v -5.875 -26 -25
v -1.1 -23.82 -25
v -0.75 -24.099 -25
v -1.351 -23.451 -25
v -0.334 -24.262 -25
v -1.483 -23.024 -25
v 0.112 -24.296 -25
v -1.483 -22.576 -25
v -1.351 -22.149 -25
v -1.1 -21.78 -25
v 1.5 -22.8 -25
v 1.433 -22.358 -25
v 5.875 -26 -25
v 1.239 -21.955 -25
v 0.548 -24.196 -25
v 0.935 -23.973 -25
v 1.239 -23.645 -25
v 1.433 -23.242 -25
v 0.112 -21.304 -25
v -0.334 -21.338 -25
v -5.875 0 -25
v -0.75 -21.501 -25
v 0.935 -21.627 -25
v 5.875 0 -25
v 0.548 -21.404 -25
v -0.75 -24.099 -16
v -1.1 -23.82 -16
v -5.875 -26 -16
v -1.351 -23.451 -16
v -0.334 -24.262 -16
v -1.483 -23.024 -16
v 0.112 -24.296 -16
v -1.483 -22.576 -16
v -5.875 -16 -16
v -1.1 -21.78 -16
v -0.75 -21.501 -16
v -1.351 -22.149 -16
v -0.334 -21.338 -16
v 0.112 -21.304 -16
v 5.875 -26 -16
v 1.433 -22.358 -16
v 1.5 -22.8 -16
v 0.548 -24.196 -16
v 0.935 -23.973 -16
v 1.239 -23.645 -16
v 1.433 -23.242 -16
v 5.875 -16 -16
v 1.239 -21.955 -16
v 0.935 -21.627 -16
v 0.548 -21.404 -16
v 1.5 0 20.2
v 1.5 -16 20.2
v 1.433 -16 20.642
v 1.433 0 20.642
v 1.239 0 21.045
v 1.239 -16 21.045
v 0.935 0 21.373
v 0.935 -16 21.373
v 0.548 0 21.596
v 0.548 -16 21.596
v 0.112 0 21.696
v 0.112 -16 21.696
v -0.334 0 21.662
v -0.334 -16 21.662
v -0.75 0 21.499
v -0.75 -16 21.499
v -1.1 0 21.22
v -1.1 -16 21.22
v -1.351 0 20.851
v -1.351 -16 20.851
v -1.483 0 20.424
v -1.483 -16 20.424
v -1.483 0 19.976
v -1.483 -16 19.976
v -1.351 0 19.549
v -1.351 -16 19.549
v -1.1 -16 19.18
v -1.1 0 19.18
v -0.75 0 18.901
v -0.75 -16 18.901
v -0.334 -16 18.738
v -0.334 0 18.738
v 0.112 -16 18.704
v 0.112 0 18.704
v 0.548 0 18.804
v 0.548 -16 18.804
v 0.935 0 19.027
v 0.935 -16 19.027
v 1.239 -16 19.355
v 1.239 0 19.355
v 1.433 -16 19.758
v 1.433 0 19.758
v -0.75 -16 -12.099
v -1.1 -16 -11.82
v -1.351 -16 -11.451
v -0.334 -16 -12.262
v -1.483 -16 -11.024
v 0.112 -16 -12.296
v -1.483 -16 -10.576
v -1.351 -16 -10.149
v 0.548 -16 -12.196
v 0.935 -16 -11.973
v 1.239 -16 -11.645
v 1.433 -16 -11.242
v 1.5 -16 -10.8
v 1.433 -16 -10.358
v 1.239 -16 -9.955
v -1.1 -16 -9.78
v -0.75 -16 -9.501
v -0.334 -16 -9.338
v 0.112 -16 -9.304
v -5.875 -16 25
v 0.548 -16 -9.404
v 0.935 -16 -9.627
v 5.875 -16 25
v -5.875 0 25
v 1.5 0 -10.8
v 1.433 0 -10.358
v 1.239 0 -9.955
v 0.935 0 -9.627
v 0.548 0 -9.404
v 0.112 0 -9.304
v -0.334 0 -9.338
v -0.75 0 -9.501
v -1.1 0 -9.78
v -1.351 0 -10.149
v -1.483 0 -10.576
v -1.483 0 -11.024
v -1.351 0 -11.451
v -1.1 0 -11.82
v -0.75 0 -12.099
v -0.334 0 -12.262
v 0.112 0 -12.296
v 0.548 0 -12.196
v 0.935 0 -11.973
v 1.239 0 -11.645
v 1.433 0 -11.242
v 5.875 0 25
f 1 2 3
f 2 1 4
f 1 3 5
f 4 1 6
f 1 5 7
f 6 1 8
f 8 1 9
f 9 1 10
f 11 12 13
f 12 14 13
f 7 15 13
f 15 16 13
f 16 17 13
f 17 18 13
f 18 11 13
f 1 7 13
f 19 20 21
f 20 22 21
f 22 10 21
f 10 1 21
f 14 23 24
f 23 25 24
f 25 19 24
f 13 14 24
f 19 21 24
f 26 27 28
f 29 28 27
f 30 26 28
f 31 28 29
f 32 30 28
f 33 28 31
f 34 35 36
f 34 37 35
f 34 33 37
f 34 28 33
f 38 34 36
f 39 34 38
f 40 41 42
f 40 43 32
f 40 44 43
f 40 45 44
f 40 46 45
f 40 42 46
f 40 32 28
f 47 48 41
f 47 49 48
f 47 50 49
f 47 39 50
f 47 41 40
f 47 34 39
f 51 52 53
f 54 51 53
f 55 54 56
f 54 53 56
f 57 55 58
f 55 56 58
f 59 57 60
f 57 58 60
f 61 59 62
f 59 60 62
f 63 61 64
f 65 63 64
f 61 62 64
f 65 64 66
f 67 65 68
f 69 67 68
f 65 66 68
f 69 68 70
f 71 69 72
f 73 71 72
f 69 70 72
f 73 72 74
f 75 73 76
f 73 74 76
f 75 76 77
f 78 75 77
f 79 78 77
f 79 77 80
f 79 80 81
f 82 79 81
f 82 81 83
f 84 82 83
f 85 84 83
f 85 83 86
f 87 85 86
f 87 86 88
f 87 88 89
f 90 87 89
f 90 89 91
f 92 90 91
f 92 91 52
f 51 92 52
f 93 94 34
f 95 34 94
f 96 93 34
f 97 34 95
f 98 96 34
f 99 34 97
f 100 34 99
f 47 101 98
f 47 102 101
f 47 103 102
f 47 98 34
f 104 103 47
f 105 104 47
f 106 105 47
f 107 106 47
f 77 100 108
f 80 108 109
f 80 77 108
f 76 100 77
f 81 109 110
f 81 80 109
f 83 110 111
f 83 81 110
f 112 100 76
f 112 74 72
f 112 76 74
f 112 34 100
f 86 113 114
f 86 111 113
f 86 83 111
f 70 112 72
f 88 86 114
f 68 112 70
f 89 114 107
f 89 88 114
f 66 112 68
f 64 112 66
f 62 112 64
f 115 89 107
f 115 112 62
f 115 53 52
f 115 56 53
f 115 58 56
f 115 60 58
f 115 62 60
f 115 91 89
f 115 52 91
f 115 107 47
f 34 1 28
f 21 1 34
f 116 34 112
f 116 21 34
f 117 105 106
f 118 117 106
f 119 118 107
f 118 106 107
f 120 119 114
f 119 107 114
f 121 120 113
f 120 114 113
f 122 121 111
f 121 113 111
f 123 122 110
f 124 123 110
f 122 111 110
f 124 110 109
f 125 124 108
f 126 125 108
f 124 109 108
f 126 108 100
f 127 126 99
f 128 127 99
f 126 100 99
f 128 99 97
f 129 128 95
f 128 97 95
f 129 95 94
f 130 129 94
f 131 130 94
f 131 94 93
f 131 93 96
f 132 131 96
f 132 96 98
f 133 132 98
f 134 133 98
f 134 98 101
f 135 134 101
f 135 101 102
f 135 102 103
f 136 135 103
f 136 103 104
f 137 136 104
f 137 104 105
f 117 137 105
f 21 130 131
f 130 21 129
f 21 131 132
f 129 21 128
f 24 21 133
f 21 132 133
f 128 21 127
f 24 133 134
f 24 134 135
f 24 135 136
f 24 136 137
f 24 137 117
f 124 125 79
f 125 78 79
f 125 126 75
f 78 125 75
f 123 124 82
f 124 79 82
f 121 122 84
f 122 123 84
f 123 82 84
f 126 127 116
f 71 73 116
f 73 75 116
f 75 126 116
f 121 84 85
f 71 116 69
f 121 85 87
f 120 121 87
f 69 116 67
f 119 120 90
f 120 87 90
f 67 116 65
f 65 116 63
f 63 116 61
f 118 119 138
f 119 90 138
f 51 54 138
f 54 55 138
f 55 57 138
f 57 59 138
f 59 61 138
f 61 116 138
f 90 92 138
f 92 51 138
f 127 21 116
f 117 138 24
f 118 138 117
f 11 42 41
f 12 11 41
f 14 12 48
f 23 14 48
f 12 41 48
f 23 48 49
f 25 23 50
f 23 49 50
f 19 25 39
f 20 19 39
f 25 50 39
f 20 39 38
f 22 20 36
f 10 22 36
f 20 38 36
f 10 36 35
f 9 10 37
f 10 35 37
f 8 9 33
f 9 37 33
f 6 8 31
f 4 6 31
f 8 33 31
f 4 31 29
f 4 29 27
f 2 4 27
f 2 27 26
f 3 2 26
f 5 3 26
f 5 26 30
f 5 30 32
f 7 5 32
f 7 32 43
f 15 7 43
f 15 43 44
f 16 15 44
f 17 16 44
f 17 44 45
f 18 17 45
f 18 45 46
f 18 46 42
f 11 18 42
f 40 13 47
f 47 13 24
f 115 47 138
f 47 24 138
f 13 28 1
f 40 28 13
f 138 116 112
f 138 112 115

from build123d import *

# Parameters (mm, degrees)
F0_W     = 11.75
F0_H     = 50
F1_DEPTH = 16
F2_R     = 1.5
F3_DEPTH = 16.001
F4_W     = 11.75
F4_H     = 9
F5_DEPTH = 10
F6_R     = 1.5
F7_DEPTH = 9.001


with BuildPart() as f1:
    # F0 (on Front) → F1 (new body)
    with BuildSketch(Plane.XZ):
        Rectangle(F0_W, F0_H)
    extrude(amount=F1_DEPTH)

    # F2 (on face) → F3 (cut, through all)
    with BuildSketch(Plane.XZ.offset(16)):
        with Locations((0, 20.2)):
            Circle(F2_R)
        with Locations((0, -10.8)):
            Circle(F2_R)
    extrude(amount=-F3_DEPTH, mode=Mode.SUBTRACT)

    # F4 (on face) → F5 (join)
    with BuildSketch(Plane.XZ.offset(16)):
        with Locations((0, -20.5)):
            Rectangle(F4_W, F4_H)
    extrude(amount=F5_DEPTH)

    # F6 (on face) → F7 (cut, through all)
    with BuildSketch(Plane.XY.offset(-16)):
        with Locations((0, -22.8)):
            Circle(F6_R)
    extrude(amount=-F7_DEPTH, mode=Mode.SUBTRACT)


solid = f1.part
